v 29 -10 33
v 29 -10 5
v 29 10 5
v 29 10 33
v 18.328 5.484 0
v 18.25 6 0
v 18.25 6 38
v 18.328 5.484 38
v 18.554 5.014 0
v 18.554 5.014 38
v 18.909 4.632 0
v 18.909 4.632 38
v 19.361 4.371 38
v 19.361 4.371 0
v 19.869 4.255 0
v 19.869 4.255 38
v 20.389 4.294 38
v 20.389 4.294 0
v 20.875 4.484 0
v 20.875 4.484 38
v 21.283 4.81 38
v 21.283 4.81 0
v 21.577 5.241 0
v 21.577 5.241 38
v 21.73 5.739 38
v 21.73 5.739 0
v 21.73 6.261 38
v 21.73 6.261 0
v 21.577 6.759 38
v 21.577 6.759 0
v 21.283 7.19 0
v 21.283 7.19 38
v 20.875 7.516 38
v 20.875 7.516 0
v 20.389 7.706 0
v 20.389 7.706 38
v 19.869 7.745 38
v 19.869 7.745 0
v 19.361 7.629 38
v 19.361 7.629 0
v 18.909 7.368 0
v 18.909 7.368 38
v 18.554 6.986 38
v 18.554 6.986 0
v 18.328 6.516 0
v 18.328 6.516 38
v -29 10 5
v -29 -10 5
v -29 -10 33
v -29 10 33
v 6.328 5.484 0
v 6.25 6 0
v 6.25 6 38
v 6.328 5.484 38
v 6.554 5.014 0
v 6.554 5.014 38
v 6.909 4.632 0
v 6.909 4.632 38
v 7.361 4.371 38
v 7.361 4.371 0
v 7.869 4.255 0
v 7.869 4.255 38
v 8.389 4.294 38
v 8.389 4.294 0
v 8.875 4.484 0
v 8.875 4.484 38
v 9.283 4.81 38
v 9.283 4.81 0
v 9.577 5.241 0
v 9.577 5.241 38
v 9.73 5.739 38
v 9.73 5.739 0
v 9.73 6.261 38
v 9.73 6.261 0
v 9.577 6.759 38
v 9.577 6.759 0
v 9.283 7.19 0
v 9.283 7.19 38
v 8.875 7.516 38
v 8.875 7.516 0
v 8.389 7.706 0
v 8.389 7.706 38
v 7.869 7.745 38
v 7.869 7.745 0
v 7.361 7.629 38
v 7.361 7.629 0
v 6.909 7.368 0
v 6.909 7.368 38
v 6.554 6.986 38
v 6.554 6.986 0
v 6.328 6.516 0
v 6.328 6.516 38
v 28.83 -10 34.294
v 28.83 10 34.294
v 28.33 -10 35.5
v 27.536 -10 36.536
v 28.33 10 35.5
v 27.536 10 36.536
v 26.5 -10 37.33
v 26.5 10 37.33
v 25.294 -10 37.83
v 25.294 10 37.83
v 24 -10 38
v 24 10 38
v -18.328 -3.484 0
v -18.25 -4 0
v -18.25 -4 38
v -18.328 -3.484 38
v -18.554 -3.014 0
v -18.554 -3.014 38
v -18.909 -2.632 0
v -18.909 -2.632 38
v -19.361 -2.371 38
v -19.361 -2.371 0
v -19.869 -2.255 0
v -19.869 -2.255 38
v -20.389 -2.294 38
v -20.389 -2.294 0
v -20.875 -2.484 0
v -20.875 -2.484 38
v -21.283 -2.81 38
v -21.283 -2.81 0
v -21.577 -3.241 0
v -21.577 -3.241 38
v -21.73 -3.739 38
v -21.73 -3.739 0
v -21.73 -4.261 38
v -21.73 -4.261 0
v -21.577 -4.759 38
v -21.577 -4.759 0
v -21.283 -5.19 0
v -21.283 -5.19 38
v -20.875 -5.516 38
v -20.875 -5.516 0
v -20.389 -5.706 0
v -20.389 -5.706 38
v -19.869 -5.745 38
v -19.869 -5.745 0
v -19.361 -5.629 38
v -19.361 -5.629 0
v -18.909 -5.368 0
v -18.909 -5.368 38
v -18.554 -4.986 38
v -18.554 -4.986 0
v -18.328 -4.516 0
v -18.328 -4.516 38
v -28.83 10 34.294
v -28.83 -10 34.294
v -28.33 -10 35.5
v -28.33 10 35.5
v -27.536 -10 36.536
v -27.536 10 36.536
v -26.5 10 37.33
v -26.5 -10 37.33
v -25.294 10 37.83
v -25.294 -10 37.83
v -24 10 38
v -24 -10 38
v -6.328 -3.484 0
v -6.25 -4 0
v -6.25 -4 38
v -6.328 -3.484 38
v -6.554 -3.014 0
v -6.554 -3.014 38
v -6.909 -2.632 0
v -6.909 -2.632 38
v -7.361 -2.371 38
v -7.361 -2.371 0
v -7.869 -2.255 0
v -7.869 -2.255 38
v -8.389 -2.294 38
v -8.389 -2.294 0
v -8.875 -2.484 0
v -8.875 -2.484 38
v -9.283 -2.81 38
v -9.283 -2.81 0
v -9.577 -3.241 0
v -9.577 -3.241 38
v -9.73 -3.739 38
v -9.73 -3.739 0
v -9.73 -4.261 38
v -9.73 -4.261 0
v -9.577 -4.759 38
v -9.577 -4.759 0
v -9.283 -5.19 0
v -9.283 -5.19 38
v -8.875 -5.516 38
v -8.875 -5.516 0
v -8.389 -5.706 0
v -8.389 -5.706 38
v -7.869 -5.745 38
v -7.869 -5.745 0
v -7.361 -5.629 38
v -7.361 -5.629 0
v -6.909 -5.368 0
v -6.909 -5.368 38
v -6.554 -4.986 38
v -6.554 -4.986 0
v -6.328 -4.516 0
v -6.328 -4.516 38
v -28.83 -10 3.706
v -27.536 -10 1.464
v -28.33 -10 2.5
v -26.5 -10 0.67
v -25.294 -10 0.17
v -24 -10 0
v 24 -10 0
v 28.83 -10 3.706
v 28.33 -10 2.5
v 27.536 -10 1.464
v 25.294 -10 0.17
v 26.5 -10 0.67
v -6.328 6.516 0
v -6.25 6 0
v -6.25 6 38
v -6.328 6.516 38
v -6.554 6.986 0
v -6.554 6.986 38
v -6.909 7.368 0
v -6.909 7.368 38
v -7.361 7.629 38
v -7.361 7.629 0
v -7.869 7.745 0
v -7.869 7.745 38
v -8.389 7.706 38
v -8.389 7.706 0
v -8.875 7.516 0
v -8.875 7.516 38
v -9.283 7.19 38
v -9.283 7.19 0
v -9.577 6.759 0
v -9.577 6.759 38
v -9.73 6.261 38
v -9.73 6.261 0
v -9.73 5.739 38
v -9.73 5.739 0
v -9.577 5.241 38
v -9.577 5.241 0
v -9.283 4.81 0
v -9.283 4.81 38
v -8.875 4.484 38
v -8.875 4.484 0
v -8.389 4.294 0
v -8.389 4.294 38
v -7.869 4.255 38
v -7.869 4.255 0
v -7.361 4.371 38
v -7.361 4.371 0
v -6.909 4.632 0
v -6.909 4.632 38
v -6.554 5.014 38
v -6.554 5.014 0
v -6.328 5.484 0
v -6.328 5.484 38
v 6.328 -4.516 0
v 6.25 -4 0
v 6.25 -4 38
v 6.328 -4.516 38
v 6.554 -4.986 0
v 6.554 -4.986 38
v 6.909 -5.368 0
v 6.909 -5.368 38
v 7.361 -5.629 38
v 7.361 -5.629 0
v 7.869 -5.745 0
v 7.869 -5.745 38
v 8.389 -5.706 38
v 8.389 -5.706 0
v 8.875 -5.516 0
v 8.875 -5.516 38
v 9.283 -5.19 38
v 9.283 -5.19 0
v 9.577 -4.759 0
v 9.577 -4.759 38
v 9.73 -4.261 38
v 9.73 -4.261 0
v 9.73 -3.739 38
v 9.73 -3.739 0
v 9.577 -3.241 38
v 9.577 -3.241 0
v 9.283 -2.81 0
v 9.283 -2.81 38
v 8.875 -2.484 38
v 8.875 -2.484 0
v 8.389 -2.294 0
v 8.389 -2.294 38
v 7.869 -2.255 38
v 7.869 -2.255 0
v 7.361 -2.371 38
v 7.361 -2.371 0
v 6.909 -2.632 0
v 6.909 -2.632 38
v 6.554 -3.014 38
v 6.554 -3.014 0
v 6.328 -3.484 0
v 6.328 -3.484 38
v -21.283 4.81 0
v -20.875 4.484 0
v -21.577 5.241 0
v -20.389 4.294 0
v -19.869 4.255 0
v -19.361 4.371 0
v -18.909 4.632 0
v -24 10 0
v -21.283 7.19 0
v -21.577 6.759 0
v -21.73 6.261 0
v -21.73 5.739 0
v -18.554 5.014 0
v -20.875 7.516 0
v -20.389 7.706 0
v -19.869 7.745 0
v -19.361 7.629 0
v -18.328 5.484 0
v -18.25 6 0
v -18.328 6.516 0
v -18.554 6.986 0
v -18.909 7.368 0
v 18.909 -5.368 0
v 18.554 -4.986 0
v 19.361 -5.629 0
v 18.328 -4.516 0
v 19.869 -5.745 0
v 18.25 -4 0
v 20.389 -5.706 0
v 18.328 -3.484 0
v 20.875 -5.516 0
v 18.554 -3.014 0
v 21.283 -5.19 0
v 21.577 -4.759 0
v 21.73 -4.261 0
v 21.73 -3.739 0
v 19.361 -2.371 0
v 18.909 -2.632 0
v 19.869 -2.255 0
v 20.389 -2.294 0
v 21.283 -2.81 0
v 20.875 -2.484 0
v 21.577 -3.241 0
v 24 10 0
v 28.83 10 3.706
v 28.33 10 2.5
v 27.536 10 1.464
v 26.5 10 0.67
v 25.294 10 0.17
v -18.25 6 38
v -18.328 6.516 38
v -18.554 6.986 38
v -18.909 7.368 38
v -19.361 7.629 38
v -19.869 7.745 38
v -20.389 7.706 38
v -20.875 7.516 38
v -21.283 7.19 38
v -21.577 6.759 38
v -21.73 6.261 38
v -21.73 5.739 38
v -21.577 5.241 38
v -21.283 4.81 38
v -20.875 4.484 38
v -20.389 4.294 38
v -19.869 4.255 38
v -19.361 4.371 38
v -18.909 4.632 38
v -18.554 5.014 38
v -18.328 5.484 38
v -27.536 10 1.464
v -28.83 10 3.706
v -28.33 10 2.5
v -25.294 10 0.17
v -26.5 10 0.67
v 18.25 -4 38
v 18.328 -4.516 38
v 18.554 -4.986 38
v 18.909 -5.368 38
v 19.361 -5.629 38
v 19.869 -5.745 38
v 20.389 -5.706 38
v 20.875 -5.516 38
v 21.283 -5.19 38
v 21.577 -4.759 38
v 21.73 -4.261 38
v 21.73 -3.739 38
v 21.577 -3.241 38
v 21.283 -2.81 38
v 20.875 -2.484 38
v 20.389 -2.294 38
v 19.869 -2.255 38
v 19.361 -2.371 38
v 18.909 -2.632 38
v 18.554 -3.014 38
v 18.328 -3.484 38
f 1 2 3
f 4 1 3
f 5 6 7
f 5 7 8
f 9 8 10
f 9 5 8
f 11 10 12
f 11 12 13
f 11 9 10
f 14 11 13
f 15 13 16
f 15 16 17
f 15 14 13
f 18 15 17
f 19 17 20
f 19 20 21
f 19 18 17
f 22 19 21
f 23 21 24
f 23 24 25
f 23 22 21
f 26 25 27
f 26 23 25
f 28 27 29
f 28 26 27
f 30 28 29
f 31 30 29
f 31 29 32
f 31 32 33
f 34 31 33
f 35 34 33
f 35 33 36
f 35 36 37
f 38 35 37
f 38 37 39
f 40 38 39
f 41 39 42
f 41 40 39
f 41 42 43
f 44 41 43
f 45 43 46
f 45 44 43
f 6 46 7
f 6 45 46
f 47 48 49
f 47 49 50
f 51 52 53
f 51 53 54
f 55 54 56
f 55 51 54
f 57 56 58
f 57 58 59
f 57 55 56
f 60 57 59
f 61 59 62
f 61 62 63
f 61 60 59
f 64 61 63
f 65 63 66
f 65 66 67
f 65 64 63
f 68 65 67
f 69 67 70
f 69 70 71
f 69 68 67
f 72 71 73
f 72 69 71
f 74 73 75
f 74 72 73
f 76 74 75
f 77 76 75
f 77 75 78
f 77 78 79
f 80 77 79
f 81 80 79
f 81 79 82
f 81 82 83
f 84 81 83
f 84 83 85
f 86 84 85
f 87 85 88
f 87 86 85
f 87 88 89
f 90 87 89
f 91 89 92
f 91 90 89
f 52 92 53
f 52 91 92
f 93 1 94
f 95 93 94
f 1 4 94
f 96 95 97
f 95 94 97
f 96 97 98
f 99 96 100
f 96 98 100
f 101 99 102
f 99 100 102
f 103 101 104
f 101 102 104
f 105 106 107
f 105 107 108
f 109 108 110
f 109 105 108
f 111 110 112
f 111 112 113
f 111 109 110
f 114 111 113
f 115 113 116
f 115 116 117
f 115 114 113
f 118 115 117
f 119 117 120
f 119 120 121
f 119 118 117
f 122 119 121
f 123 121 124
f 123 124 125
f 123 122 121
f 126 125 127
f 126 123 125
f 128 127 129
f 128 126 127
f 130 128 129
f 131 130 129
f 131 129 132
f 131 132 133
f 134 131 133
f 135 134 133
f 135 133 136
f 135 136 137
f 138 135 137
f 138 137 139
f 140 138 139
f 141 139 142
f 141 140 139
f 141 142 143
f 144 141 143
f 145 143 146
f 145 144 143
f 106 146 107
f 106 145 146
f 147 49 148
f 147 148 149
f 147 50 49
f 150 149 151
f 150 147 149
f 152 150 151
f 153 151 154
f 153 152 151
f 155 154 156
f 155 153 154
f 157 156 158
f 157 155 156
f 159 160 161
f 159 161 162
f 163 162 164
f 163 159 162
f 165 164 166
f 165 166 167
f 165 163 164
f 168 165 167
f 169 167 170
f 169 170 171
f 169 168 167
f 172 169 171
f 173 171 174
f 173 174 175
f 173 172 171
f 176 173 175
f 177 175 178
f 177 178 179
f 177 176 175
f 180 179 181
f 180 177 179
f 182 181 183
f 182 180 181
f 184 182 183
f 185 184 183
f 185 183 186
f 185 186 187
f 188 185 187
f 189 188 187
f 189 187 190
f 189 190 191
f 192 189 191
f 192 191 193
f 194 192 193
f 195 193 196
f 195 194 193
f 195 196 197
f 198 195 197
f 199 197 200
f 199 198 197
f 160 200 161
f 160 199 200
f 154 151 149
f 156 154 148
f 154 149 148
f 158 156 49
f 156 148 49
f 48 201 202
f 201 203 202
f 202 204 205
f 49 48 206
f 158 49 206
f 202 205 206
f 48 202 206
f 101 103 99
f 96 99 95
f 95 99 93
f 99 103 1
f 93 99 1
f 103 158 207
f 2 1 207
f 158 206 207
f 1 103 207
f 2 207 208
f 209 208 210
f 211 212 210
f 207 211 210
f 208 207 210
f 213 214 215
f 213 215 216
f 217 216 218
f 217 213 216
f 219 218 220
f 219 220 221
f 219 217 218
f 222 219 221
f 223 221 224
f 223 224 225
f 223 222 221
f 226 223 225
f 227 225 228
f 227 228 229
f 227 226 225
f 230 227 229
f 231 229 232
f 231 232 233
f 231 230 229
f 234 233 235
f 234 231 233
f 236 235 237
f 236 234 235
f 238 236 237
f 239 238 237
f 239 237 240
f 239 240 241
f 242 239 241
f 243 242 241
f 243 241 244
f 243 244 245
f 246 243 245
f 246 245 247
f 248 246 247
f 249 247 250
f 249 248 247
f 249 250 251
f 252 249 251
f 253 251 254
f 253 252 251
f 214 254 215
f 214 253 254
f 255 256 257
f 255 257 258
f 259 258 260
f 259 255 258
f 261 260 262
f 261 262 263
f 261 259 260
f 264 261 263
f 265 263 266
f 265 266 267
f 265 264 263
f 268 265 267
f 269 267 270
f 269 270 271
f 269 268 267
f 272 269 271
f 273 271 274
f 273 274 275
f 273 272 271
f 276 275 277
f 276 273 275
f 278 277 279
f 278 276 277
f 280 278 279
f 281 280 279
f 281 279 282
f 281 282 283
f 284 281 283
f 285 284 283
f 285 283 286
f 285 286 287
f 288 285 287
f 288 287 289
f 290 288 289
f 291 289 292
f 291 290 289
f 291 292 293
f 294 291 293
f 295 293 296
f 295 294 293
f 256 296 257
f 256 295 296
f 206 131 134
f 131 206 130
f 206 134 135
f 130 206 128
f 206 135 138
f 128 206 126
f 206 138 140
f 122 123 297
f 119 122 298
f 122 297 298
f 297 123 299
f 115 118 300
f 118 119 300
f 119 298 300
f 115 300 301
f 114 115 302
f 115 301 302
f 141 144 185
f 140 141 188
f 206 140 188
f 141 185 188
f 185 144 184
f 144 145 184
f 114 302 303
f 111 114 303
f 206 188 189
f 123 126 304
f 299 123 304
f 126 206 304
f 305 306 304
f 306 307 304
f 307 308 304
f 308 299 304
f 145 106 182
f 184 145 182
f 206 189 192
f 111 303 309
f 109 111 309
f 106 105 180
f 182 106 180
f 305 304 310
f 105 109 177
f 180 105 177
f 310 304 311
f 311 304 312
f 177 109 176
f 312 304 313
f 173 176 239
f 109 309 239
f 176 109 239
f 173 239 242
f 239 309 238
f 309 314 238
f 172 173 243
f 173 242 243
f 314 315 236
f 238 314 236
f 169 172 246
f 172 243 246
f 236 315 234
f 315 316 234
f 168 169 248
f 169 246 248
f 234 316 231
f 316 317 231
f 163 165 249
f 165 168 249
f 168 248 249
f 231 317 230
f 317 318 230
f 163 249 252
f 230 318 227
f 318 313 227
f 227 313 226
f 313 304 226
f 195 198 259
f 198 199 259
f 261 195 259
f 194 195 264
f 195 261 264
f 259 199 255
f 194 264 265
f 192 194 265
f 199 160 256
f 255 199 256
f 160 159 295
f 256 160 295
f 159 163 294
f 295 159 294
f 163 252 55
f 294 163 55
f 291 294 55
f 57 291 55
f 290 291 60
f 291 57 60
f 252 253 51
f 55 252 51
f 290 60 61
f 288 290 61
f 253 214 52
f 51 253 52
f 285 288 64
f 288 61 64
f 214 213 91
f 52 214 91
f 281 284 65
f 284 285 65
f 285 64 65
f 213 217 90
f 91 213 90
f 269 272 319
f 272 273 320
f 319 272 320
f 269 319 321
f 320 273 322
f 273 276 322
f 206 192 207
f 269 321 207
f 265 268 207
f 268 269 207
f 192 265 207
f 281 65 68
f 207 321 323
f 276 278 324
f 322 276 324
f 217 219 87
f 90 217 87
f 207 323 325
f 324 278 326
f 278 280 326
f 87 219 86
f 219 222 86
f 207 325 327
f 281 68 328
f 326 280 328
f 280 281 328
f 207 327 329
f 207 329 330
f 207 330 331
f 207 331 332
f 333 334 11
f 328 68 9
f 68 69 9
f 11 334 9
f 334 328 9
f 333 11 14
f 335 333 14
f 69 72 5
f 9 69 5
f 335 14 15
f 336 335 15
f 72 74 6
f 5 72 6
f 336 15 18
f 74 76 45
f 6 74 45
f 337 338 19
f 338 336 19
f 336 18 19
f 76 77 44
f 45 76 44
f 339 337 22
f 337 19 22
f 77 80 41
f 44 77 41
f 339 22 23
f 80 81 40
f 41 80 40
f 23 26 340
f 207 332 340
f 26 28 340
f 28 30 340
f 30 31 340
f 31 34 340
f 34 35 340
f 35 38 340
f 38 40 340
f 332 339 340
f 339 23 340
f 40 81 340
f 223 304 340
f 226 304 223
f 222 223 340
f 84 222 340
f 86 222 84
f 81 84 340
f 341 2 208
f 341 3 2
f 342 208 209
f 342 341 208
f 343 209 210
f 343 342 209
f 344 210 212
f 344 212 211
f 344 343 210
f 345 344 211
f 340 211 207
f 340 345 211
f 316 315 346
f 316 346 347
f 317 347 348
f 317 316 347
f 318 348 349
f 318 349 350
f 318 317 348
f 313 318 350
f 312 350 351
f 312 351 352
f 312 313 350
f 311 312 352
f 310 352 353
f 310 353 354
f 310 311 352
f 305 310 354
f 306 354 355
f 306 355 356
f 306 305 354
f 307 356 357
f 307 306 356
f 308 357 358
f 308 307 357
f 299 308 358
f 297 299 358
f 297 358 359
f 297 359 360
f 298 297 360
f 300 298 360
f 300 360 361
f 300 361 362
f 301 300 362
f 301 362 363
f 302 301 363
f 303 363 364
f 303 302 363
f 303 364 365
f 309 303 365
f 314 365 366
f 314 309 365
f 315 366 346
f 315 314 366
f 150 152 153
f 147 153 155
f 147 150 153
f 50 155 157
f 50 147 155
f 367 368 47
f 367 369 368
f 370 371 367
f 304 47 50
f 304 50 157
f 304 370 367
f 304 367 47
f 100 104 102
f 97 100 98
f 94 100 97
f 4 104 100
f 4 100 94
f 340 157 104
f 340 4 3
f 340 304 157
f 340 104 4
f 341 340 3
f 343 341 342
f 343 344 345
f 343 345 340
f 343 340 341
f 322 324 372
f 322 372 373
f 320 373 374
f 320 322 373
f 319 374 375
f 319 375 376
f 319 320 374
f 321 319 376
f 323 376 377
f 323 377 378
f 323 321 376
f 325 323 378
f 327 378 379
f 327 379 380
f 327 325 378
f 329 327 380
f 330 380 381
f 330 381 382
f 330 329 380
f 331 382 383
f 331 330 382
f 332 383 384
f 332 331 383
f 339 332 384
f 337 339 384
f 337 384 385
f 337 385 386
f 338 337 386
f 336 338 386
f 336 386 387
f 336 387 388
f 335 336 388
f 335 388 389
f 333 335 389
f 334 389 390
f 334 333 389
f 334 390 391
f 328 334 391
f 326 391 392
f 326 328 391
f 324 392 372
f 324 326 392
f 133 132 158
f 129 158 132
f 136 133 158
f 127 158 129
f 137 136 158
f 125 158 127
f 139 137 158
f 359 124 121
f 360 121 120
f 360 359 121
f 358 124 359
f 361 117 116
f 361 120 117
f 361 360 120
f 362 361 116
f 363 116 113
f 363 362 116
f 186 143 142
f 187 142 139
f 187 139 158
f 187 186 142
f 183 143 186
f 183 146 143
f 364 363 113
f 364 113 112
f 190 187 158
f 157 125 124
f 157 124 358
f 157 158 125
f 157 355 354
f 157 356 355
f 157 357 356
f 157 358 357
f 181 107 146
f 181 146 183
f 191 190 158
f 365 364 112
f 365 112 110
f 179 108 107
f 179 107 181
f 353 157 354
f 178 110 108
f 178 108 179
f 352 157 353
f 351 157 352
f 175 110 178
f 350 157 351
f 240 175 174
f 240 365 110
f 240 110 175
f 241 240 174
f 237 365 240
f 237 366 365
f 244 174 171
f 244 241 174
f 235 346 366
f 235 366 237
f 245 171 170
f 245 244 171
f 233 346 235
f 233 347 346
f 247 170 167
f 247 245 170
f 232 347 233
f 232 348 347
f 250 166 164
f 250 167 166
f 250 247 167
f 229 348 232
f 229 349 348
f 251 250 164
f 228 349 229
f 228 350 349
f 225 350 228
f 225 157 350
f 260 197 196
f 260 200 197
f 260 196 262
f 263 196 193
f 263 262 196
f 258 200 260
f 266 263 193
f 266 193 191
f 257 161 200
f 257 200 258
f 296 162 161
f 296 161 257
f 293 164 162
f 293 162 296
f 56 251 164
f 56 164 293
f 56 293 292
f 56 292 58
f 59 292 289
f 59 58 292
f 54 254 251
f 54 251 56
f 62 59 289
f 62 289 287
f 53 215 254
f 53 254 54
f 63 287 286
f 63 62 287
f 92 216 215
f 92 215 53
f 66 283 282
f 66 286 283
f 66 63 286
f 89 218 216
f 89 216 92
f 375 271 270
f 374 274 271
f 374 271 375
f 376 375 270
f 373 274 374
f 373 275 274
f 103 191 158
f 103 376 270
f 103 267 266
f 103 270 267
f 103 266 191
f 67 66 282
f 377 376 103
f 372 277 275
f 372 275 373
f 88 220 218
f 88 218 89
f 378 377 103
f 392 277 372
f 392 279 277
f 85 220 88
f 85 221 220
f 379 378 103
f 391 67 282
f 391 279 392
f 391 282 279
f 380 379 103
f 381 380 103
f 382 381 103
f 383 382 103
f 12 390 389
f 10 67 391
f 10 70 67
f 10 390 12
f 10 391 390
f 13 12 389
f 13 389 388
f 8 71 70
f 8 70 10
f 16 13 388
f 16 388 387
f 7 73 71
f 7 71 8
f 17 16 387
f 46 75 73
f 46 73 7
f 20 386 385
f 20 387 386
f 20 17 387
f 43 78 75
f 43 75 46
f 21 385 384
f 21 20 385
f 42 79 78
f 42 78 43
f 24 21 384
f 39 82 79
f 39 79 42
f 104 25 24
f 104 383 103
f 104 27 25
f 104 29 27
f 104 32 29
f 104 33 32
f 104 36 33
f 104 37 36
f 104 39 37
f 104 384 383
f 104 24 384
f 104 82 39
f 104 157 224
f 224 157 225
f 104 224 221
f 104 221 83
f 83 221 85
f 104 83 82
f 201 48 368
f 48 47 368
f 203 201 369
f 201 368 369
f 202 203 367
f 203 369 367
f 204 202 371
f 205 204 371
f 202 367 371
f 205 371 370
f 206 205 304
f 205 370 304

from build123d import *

# Parameters (mm, degrees)
SKETCH_1_W      = 58
SKETCH_1_H      = 20
SKETCH_1_R      = 1.75
EXTRUDE_1_DEPTH = 38
FILLET_1_R      = 5


with BuildPart() as part:
    # 草图1 → 凸台-拉伸1 (new body)
    with BuildSketch(Plane.XY):
        Rectangle(SKETCH_1_W, SKETCH_1_H)
        with Locations((-20, 6)):
            Circle(SKETCH_1_R, mode=Mode.SUBTRACT)
        with Locations((-8, 6)):
            Circle(SKETCH_1_R, mode=Mode.SUBTRACT)
        with Locations(Location((8, 6, 0), (0, 0, 180))):
            Circle(SKETCH_1_R, mode=Mode.SUBTRACT)
        with Locations(Location((20, 6, 0), (0, 0, 180))):
            Circle(SKETCH_1_R, mode=Mode.SUBTRACT)
        with Locations((-20, -4)):
            Circle(SKETCH_1_R, mode=Mode.SUBTRACT)
        with Locations((-8, -4)):
            Circle(SKETCH_1_R, mode=Mode.SUBTRACT)
        with Locations(Location((8, -4, 0), (0, 0, 180))):
            Circle(SKETCH_1_R, mode=Mode.SUBTRACT)
        with Locations(Location((20, -4, 0), (0, 0, 180))):
            Circle(SKETCH_1_R, mode=Mode.SUBTRACT)
    extrude(amount=EXTRUDE_1_DEPTH)

    # 圆角1
    fillet_1_edges = [part.edges().sort_by_distance(p)[0] for p in [
        (-29, 0, 38),
        (29, 0, 38),
        (-29, 0, 0),
        (29, 0, 0),
    ]]
    fillet(fillet_1_edges, radius=FILLET_1_R)


solid = part.part
